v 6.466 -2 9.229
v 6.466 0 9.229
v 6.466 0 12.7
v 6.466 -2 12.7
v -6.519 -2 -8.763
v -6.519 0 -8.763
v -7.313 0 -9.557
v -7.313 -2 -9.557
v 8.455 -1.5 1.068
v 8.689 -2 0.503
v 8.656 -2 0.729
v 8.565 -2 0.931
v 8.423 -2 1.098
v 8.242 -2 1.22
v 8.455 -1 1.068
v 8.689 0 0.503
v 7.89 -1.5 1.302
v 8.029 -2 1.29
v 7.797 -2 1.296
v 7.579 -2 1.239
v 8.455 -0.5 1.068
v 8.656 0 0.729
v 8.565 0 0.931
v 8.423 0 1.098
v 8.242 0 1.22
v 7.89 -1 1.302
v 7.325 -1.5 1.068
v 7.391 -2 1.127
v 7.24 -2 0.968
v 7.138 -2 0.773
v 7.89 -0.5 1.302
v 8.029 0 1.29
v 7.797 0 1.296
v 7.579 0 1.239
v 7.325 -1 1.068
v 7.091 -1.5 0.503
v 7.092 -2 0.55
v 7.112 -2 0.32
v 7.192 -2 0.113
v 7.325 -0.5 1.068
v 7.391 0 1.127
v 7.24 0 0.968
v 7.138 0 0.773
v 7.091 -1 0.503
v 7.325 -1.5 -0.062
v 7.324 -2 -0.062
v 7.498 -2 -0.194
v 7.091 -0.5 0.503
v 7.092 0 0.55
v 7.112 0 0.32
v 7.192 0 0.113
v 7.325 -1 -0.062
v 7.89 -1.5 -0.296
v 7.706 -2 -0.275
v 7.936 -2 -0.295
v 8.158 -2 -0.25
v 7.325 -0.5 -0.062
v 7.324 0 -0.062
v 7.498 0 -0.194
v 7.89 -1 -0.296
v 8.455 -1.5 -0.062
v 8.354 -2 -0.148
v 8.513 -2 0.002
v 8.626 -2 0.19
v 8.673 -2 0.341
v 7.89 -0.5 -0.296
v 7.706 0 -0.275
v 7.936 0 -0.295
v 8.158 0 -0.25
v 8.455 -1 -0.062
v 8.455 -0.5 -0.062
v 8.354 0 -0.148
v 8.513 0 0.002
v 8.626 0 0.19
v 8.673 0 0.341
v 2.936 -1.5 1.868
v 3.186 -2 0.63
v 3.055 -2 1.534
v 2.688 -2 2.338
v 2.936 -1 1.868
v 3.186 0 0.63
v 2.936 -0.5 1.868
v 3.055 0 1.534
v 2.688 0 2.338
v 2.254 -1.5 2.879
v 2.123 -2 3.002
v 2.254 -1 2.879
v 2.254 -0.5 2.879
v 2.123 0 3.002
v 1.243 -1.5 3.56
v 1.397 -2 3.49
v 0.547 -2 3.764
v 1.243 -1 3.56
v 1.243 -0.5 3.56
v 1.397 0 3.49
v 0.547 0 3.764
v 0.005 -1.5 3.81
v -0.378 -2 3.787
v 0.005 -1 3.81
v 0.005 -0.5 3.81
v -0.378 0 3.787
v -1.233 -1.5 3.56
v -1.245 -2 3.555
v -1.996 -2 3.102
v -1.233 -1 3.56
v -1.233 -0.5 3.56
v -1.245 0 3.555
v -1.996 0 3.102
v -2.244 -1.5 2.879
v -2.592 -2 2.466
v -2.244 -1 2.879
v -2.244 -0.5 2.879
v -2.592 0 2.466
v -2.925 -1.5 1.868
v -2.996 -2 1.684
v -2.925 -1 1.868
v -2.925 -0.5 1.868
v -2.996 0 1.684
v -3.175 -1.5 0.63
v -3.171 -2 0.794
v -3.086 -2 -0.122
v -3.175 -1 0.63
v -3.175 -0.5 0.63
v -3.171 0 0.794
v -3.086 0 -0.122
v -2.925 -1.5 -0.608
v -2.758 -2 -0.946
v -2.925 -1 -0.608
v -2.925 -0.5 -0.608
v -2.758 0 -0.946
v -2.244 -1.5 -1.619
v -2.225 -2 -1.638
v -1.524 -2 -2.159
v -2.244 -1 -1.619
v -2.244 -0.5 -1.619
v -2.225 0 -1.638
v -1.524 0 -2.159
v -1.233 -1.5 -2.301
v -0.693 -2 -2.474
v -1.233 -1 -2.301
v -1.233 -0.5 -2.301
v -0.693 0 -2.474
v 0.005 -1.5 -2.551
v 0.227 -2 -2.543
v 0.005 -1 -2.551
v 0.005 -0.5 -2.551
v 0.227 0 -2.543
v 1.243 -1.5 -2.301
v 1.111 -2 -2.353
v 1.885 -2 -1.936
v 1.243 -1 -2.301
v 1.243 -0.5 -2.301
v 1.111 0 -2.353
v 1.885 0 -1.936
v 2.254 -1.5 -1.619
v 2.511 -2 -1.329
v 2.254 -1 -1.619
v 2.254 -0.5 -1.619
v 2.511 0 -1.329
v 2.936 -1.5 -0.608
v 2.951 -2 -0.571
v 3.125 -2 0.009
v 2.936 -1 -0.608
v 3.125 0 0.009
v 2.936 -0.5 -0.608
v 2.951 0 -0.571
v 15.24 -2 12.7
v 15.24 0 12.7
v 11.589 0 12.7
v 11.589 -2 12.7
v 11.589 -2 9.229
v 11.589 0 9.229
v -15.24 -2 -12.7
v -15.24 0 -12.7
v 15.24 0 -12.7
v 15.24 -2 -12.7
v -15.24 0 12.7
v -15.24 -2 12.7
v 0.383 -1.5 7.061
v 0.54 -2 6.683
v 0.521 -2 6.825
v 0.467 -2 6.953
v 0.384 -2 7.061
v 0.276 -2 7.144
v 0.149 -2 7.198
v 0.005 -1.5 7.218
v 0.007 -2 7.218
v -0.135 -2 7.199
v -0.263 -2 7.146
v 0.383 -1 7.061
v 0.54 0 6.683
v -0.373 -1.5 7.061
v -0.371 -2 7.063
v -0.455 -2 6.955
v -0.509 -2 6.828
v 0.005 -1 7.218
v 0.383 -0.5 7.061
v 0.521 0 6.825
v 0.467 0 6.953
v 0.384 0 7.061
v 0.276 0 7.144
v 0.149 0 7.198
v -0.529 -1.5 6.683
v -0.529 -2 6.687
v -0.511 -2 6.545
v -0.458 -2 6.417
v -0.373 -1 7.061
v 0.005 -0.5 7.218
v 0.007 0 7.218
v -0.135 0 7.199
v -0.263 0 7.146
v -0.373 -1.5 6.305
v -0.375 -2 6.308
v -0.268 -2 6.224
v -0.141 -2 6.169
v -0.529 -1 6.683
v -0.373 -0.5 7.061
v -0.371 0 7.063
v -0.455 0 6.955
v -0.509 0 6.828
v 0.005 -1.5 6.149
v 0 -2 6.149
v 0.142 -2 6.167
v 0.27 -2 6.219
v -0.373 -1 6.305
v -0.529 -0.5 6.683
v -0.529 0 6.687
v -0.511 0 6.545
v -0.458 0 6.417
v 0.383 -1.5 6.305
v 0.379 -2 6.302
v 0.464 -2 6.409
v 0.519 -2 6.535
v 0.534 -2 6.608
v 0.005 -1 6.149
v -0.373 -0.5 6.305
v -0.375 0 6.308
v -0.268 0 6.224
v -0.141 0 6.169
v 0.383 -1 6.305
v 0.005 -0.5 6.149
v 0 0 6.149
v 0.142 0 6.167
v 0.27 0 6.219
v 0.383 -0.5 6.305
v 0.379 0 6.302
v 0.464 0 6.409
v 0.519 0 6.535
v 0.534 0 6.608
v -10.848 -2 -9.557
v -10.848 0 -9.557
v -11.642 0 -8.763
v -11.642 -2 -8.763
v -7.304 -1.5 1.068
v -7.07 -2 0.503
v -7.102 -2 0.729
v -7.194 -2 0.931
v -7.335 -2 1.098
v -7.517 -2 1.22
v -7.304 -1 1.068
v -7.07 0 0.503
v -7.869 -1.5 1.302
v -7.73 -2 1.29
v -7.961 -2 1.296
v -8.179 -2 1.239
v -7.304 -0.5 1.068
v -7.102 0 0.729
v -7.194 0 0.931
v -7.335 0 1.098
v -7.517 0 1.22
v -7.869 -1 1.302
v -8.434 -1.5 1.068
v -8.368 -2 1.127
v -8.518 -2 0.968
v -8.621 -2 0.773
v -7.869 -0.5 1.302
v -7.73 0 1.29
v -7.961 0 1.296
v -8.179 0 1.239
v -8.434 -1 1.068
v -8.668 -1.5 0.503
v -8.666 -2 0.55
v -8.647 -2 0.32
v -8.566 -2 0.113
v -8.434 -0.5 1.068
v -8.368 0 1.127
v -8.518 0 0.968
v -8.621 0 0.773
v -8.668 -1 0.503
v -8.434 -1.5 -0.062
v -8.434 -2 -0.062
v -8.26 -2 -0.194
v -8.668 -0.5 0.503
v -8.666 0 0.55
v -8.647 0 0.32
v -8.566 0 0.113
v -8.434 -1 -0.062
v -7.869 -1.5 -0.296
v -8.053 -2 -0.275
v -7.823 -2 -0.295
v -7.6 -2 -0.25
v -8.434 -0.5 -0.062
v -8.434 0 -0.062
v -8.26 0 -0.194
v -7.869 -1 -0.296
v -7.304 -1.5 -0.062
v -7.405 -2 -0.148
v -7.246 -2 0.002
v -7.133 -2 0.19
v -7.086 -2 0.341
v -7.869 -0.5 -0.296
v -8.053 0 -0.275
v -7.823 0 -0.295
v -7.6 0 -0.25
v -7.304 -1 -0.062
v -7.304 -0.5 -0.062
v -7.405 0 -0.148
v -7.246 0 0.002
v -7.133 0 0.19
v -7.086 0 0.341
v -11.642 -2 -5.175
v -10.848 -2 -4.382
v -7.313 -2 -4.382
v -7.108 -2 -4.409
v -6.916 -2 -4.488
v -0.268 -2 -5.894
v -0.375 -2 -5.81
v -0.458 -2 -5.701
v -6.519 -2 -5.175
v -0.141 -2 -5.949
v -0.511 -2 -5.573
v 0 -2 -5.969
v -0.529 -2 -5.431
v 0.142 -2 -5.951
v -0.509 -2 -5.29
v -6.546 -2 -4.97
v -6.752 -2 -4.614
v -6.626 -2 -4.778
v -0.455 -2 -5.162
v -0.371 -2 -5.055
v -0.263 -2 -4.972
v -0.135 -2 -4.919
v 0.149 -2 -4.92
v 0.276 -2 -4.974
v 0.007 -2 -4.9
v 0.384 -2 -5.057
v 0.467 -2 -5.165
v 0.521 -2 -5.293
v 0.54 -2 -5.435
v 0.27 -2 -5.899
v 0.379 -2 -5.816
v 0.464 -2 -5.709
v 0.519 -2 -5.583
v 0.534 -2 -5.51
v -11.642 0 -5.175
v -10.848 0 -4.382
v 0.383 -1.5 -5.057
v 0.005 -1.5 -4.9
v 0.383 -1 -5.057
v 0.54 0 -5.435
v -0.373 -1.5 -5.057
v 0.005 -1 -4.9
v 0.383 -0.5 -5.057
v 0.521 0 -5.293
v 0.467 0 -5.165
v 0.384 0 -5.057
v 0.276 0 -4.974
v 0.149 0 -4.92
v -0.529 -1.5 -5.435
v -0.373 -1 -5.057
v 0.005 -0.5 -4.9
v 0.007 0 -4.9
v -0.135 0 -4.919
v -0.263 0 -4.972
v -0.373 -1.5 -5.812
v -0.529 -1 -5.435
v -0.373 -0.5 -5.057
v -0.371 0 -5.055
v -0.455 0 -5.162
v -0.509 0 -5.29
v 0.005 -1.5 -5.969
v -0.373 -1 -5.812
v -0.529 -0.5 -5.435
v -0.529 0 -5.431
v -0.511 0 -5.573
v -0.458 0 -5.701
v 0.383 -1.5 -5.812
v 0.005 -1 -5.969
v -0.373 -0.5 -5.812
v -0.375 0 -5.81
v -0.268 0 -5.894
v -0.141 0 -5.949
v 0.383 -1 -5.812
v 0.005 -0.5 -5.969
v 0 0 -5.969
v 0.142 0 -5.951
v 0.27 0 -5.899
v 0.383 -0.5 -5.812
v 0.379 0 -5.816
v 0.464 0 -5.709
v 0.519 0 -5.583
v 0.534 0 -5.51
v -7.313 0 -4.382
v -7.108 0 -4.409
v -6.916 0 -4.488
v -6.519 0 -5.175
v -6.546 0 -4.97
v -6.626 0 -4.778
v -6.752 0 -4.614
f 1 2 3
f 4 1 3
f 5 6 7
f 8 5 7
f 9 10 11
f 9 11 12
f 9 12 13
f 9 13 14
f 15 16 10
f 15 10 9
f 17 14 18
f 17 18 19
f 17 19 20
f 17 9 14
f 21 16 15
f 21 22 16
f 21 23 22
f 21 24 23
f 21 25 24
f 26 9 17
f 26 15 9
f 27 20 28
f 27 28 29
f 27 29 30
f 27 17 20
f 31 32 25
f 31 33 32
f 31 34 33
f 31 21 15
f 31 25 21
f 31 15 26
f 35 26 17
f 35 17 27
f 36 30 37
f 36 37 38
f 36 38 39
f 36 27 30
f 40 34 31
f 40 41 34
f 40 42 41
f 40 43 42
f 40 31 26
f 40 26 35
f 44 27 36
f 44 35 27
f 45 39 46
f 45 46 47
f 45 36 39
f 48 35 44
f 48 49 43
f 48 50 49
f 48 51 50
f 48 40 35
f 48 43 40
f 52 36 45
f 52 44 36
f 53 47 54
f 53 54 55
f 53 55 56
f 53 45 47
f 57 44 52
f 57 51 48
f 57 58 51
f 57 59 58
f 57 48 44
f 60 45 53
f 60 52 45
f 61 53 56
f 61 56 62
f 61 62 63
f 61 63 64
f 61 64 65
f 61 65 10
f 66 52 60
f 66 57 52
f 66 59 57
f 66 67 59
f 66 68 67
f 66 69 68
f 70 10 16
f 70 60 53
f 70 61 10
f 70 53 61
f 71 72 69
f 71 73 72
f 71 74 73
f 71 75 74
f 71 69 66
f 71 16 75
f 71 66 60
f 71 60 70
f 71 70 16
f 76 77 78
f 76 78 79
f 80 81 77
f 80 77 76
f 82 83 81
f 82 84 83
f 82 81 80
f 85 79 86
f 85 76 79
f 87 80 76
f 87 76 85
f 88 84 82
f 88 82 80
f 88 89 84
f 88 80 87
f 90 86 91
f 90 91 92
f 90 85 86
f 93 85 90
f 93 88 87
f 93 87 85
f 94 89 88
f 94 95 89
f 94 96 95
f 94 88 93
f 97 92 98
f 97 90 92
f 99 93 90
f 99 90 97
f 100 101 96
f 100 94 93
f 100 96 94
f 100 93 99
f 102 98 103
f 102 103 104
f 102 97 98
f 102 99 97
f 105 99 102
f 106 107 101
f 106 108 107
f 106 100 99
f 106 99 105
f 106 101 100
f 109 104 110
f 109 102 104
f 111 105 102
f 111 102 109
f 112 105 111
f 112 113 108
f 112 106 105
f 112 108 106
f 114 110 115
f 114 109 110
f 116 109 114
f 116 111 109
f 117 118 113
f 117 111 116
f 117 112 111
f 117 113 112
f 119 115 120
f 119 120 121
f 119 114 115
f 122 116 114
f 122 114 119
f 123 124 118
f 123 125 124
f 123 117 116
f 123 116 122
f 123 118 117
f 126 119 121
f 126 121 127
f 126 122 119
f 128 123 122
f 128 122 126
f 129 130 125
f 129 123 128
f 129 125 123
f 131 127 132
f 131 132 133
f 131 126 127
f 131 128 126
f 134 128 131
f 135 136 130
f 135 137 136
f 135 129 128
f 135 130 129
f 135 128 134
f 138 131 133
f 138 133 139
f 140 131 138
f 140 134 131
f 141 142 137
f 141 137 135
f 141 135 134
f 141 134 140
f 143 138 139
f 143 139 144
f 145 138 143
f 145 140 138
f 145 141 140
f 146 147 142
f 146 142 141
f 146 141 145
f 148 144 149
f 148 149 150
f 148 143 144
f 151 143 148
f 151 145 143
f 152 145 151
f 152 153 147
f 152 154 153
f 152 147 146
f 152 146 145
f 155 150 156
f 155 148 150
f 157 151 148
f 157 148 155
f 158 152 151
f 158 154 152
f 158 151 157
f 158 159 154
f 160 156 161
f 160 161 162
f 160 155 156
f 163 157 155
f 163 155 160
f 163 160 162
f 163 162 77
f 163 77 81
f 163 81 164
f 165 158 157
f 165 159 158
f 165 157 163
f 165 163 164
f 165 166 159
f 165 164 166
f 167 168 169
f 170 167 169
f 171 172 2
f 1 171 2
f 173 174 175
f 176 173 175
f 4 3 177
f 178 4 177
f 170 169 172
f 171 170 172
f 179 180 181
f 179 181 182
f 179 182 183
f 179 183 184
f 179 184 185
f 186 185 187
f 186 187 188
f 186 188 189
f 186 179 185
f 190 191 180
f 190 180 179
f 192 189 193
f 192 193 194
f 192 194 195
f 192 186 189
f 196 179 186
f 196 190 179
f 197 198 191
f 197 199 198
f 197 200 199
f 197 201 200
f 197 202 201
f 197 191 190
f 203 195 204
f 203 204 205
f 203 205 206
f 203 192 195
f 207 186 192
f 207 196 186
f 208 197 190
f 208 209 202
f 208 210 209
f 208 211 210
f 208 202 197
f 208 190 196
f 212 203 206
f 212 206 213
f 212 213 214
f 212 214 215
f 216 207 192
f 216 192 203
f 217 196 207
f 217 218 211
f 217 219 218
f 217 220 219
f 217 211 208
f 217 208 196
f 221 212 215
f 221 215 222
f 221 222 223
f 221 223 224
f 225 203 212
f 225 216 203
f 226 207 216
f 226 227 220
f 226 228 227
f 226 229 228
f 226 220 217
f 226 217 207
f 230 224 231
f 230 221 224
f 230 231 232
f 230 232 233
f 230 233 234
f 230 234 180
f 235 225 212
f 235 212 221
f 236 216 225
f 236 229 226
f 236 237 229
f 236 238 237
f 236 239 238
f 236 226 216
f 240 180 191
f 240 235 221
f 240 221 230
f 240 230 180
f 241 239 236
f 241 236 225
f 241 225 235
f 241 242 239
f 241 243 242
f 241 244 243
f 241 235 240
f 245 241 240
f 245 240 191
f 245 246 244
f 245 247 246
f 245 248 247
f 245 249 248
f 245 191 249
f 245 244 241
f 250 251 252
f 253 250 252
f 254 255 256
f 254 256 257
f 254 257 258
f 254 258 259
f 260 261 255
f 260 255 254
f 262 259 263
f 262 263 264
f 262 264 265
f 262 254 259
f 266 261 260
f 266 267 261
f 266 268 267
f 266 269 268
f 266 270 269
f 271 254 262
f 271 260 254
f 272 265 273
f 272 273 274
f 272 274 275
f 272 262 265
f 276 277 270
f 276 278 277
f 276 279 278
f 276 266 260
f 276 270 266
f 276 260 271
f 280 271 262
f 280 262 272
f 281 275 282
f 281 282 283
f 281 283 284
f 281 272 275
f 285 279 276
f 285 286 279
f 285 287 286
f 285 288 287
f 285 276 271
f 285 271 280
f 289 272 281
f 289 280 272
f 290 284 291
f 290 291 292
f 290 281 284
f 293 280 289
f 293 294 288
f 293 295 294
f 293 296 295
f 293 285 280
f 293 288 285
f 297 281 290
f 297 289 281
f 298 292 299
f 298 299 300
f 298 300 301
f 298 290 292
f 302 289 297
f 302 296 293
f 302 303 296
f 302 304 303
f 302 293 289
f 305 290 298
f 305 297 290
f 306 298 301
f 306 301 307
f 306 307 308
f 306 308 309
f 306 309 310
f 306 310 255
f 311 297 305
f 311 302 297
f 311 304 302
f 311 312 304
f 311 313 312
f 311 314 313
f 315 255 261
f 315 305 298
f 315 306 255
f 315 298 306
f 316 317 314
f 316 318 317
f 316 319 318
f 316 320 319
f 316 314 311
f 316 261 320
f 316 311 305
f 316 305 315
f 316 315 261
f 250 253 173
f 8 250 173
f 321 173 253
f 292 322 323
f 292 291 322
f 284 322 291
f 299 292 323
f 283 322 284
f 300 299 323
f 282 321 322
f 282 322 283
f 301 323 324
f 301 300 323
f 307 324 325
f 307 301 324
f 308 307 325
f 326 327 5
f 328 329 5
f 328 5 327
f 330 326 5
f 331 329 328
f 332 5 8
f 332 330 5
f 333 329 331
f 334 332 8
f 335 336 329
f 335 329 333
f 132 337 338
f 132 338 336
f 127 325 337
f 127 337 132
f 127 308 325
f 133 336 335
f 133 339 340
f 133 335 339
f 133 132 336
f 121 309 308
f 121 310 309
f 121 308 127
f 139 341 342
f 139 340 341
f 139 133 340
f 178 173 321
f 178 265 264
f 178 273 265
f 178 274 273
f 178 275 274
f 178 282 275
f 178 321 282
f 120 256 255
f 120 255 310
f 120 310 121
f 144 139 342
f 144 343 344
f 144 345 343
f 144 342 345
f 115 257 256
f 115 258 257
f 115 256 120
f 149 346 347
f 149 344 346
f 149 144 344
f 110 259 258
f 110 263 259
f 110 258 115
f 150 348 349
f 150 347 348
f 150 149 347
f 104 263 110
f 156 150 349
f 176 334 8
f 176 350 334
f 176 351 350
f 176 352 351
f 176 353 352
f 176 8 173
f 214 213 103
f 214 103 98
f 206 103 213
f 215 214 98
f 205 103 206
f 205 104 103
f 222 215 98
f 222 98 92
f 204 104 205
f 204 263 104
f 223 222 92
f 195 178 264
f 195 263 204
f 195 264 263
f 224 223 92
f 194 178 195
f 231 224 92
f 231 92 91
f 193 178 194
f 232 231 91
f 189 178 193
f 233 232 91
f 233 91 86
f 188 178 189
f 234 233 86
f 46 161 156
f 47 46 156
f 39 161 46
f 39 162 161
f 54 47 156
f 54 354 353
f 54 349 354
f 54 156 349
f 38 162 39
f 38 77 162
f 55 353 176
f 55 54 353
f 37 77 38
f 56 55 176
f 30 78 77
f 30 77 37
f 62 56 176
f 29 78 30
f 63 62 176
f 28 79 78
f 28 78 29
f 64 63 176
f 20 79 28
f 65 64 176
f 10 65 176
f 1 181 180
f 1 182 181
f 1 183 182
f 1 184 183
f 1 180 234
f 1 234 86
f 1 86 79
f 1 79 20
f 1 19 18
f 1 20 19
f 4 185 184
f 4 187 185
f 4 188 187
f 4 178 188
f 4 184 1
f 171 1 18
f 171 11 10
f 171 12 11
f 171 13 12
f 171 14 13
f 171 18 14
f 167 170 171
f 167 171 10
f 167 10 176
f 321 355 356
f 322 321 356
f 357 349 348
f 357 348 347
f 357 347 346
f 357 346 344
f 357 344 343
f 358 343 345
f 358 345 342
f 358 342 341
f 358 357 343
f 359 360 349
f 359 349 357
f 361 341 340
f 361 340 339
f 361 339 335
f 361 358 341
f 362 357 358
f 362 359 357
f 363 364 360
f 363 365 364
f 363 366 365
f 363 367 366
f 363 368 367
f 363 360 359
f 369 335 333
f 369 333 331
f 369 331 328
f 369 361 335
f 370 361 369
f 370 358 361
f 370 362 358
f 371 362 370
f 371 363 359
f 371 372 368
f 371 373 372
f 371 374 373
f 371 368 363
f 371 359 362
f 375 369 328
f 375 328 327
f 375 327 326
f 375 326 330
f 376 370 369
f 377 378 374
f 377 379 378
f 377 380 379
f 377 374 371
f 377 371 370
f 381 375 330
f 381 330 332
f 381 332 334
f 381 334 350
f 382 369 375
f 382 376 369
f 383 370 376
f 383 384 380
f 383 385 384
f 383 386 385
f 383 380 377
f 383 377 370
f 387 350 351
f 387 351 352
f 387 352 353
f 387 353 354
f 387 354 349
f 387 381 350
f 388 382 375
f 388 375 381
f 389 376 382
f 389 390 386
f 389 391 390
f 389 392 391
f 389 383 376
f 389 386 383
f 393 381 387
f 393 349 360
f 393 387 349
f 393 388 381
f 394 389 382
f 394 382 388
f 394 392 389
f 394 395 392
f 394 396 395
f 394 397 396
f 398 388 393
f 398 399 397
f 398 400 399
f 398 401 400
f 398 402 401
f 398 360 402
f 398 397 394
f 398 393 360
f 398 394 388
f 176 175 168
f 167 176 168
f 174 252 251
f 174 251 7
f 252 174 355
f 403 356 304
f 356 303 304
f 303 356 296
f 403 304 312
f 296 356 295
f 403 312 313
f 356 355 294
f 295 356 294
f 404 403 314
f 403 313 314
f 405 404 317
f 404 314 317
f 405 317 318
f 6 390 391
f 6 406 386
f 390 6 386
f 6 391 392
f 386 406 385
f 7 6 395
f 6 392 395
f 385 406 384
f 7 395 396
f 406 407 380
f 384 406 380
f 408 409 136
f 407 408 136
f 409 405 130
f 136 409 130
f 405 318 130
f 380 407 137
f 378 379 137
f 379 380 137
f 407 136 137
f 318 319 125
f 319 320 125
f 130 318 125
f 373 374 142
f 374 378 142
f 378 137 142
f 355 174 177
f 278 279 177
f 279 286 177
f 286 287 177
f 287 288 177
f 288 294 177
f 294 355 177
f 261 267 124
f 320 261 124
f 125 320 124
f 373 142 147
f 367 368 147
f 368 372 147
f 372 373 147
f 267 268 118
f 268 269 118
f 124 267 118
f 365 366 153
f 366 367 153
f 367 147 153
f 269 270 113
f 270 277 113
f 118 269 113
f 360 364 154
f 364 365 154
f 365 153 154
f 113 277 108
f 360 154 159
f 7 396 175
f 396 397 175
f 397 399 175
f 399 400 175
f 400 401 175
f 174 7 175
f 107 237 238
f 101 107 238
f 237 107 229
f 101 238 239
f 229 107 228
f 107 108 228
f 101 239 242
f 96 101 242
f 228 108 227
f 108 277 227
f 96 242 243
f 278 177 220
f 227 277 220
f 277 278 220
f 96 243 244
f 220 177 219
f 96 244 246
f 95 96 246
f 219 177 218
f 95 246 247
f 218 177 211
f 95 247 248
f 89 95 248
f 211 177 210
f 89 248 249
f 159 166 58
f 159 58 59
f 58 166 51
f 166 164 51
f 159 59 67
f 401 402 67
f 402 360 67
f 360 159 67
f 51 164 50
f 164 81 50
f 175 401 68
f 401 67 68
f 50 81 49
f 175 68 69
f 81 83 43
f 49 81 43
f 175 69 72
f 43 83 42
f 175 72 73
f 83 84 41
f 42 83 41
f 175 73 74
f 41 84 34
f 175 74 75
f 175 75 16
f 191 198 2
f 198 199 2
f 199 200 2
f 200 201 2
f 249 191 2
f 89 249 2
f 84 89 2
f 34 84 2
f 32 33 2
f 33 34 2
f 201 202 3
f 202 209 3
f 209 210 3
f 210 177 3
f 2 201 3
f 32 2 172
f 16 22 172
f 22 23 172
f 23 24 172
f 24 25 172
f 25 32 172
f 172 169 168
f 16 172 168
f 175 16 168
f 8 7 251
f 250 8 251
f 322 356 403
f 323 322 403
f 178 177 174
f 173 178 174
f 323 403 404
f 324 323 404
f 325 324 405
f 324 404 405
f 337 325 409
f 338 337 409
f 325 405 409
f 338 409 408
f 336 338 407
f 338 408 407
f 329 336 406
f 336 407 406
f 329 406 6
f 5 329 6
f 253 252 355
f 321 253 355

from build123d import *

# Parameters (mm, degrees)
F1_DEPTH = 2


with BuildPart() as f1:
    # F0 (on Front) → F1 (new body)
    with BuildSketch(Plane.XZ):
        Polygon((-15.24, 12.7), (-15.24, -12.7), (15.24, -12.7), (15.24, 12.7), (11.58875, 12.7), (11.58875, 9.2292314502), (6.46642, 9.2292314502), (6.46642, 12.7), align=None)
        with BuildLine():
            Line((-11.641663, -5.17525), (-10.847913, -4.3815))
            Line((-10.847913, -4.3815), (-7.31308, -4.3815))
            ThreePointArc((-7.31308, -4.3815), (-6.7518139924, -4.6139839924), (-6.51933, -5.17525))
            Line((-6.51933, -5.17525), (-6.51933, -8.763))
            Line((-6.51933, -8.763), (-7.31308, -9.55675))
            Line((-7.31308, -9.55675), (-10.847913, -9.55675))
            Line((-10.847913, -9.55675), (-11.641663, -8.763))
            Line((-11.641663, -8.763), (-11.641663, -5.17525))
        make_face(mode=Mode.SUBTRACT)
        with BuildLine():
            add(Edge.make_bspline(
                [(0.005281, -5.969), (0.300451, -5.969), (0.539736, -5.729716), (0.539736, -5.434542)],
                knots=[0, 0, 0, 0, 1, 1, 1, 1], degree=3))
            add(Edge.make_bspline(
                [(-0.529178, -5.434542), (-0.529178, -5.729716), (-0.289893, -5.969), (0.005281, -5.969)],
                knots=[0, 0, 0, 0, 1, 1, 1, 1], degree=3))
            add(Edge.make_bspline(
                [(0.005281, -4.900084), (-0.289893, -4.900084), (-0.529178, -5.139369), (-0.529178, -5.434542)],
                knots=[0, 0, 0, 0, 1, 1, 1, 1], degree=3))
            add(Edge.make_bspline(
                [(0.539736, -5.434542), (0.539736, -5.139369), (0.300451, -4.900084), (0.005281, -4.900084)],
                knots=[0, 0, 0, 0, 1, 1, 1, 1], degree=3))
        make_face(mode=Mode.SUBTRACT)
        with BuildLine():
            add(Edge.make_bspline(
                [(-7.868719, -0.296334), (-7.427422, -0.296334), (-7.069678, 0.061408), (-7.069678, 0.502708)],
                knots=[0, 0, 0, 0, 1, 1, 1, 1], degree=3))
            add(Edge.make_bspline(
                [(-8.667764, 0.502708), (-8.667764, 0.061408), (-8.310019, -0.296334), (-7.868719, -0.296334)],
                knots=[0, 0, 0, 0, 1, 1, 1, 1], degree=3))
            add(Edge.make_bspline(
                [(-7.868719, 1.30175), (-8.310019, 1.30175), (-8.667764, 0.944007), (-8.667764, 0.502708)],
                knots=[0, 0, 0, 0, 1, 1, 1, 1], degree=3))
            add(Edge.make_bspline(
                [(-7.069678, 0.502708), (-7.069678, 0.944007), (-7.427422, 1.30175), (-7.868719, 1.30175)],
                knots=[0, 0, 0, 0, 1, 1, 1, 1], degree=3))
        make_face(mode=Mode.SUBTRACT)
        with BuildLine():
            add(Edge.make_bspline(
                [(0.005281, -2.550584), (1.761708, -2.550584), (3.185572, -1.126719), (3.185572, 0.629708)],
                knots=[0, 0, 0, 0, 1, 1, 1, 1], degree=3))
            add(Edge.make_bspline(
                [(-3.175014, 0.629708), (-3.175014, -1.126719), (-1.751146, -2.550584), (0.005281, -2.550584)],
                knots=[0, 0, 0, 0, 1, 1, 1, 1], degree=3))
            add(Edge.make_bspline(
                [(0.005281, 3.81), (-1.751146, 3.81), (-3.175014, 2.386135), (-3.175014, 0.629708)],
                knots=[0, 0, 0, 0, 1, 1, 1, 1], degree=3))
            add(Edge.make_bspline(
                [(3.185572, 0.629708), (3.185572, 2.386135), (1.761708, 3.81), (0.005281, 3.81)],
                knots=[0, 0, 0, 0, 1, 1, 1, 1], degree=3))
        make_face(mode=Mode.SUBTRACT)
        with BuildLine():
            add(Edge.make_bspline(
                [(7.889861, -0.296334), (8.331161, -0.296334), (8.688906, 0.061408), (8.688906, 0.502708)],
                knots=[0, 0, 0, 0, 1, 1, 1, 1], degree=3))
            add(Edge.make_bspline(
                [(7.090822, 0.502708), (7.090822, 0.061408), (7.448564, -0.296334), (7.889861, -0.296334)],
                knots=[0, 0, 0, 0, 1, 1, 1, 1], degree=3))
            add(Edge.make_bspline(
                [(7.889861, 1.30175), (7.448564, 1.30175), (7.090822, 0.944007), (7.090822, 0.502708)],
                knots=[0, 0, 0, 0, 1, 1, 1, 1], degree=3))
            add(Edge.make_bspline(
                [(8.688906, 0.502708), (8.688906, 0.944007), (8.331161, 1.30175), (7.889861, 1.30175)],
                knots=[0, 0, 0, 0, 1, 1, 1, 1], degree=3))
        make_face(mode=Mode.SUBTRACT)
        with BuildLine():
            add(Edge.make_bspline(
                [(0.005281, 6.148916), (0.300451, 6.148916), (0.539736, 6.388201), (0.539736, 6.683375)],
                knots=[0, 0, 0, 0, 1, 1, 1, 1], degree=3))
            add(Edge.make_bspline(
                [(-0.529178, 6.683375), (-0.529178, 6.388201), (-0.289893, 6.148916), (0.005281, 6.148916)],
                knots=[0, 0, 0, 0, 1, 1, 1, 1], degree=3))
            add(Edge.make_bspline(
                [(0.005281, 7.217833), (-0.289893, 7.217833), (-0.529178, 6.978548), (-0.529178, 6.683375)],
                knots=[0, 0, 0, 0, 1, 1, 1, 1], degree=3))
            add(Edge.make_bspline(
                [(0.539736, 6.683375), (0.539736, 6.978548), (0.300451, 7.217833), (0.005281, 7.217833)],
                knots=[0, 0, 0, 0, 1, 1, 1, 1], degree=3))
        make_face(mode=Mode.SUBTRACT)
    extrude(amount=F1_DEPTH)


solid = f1.part
